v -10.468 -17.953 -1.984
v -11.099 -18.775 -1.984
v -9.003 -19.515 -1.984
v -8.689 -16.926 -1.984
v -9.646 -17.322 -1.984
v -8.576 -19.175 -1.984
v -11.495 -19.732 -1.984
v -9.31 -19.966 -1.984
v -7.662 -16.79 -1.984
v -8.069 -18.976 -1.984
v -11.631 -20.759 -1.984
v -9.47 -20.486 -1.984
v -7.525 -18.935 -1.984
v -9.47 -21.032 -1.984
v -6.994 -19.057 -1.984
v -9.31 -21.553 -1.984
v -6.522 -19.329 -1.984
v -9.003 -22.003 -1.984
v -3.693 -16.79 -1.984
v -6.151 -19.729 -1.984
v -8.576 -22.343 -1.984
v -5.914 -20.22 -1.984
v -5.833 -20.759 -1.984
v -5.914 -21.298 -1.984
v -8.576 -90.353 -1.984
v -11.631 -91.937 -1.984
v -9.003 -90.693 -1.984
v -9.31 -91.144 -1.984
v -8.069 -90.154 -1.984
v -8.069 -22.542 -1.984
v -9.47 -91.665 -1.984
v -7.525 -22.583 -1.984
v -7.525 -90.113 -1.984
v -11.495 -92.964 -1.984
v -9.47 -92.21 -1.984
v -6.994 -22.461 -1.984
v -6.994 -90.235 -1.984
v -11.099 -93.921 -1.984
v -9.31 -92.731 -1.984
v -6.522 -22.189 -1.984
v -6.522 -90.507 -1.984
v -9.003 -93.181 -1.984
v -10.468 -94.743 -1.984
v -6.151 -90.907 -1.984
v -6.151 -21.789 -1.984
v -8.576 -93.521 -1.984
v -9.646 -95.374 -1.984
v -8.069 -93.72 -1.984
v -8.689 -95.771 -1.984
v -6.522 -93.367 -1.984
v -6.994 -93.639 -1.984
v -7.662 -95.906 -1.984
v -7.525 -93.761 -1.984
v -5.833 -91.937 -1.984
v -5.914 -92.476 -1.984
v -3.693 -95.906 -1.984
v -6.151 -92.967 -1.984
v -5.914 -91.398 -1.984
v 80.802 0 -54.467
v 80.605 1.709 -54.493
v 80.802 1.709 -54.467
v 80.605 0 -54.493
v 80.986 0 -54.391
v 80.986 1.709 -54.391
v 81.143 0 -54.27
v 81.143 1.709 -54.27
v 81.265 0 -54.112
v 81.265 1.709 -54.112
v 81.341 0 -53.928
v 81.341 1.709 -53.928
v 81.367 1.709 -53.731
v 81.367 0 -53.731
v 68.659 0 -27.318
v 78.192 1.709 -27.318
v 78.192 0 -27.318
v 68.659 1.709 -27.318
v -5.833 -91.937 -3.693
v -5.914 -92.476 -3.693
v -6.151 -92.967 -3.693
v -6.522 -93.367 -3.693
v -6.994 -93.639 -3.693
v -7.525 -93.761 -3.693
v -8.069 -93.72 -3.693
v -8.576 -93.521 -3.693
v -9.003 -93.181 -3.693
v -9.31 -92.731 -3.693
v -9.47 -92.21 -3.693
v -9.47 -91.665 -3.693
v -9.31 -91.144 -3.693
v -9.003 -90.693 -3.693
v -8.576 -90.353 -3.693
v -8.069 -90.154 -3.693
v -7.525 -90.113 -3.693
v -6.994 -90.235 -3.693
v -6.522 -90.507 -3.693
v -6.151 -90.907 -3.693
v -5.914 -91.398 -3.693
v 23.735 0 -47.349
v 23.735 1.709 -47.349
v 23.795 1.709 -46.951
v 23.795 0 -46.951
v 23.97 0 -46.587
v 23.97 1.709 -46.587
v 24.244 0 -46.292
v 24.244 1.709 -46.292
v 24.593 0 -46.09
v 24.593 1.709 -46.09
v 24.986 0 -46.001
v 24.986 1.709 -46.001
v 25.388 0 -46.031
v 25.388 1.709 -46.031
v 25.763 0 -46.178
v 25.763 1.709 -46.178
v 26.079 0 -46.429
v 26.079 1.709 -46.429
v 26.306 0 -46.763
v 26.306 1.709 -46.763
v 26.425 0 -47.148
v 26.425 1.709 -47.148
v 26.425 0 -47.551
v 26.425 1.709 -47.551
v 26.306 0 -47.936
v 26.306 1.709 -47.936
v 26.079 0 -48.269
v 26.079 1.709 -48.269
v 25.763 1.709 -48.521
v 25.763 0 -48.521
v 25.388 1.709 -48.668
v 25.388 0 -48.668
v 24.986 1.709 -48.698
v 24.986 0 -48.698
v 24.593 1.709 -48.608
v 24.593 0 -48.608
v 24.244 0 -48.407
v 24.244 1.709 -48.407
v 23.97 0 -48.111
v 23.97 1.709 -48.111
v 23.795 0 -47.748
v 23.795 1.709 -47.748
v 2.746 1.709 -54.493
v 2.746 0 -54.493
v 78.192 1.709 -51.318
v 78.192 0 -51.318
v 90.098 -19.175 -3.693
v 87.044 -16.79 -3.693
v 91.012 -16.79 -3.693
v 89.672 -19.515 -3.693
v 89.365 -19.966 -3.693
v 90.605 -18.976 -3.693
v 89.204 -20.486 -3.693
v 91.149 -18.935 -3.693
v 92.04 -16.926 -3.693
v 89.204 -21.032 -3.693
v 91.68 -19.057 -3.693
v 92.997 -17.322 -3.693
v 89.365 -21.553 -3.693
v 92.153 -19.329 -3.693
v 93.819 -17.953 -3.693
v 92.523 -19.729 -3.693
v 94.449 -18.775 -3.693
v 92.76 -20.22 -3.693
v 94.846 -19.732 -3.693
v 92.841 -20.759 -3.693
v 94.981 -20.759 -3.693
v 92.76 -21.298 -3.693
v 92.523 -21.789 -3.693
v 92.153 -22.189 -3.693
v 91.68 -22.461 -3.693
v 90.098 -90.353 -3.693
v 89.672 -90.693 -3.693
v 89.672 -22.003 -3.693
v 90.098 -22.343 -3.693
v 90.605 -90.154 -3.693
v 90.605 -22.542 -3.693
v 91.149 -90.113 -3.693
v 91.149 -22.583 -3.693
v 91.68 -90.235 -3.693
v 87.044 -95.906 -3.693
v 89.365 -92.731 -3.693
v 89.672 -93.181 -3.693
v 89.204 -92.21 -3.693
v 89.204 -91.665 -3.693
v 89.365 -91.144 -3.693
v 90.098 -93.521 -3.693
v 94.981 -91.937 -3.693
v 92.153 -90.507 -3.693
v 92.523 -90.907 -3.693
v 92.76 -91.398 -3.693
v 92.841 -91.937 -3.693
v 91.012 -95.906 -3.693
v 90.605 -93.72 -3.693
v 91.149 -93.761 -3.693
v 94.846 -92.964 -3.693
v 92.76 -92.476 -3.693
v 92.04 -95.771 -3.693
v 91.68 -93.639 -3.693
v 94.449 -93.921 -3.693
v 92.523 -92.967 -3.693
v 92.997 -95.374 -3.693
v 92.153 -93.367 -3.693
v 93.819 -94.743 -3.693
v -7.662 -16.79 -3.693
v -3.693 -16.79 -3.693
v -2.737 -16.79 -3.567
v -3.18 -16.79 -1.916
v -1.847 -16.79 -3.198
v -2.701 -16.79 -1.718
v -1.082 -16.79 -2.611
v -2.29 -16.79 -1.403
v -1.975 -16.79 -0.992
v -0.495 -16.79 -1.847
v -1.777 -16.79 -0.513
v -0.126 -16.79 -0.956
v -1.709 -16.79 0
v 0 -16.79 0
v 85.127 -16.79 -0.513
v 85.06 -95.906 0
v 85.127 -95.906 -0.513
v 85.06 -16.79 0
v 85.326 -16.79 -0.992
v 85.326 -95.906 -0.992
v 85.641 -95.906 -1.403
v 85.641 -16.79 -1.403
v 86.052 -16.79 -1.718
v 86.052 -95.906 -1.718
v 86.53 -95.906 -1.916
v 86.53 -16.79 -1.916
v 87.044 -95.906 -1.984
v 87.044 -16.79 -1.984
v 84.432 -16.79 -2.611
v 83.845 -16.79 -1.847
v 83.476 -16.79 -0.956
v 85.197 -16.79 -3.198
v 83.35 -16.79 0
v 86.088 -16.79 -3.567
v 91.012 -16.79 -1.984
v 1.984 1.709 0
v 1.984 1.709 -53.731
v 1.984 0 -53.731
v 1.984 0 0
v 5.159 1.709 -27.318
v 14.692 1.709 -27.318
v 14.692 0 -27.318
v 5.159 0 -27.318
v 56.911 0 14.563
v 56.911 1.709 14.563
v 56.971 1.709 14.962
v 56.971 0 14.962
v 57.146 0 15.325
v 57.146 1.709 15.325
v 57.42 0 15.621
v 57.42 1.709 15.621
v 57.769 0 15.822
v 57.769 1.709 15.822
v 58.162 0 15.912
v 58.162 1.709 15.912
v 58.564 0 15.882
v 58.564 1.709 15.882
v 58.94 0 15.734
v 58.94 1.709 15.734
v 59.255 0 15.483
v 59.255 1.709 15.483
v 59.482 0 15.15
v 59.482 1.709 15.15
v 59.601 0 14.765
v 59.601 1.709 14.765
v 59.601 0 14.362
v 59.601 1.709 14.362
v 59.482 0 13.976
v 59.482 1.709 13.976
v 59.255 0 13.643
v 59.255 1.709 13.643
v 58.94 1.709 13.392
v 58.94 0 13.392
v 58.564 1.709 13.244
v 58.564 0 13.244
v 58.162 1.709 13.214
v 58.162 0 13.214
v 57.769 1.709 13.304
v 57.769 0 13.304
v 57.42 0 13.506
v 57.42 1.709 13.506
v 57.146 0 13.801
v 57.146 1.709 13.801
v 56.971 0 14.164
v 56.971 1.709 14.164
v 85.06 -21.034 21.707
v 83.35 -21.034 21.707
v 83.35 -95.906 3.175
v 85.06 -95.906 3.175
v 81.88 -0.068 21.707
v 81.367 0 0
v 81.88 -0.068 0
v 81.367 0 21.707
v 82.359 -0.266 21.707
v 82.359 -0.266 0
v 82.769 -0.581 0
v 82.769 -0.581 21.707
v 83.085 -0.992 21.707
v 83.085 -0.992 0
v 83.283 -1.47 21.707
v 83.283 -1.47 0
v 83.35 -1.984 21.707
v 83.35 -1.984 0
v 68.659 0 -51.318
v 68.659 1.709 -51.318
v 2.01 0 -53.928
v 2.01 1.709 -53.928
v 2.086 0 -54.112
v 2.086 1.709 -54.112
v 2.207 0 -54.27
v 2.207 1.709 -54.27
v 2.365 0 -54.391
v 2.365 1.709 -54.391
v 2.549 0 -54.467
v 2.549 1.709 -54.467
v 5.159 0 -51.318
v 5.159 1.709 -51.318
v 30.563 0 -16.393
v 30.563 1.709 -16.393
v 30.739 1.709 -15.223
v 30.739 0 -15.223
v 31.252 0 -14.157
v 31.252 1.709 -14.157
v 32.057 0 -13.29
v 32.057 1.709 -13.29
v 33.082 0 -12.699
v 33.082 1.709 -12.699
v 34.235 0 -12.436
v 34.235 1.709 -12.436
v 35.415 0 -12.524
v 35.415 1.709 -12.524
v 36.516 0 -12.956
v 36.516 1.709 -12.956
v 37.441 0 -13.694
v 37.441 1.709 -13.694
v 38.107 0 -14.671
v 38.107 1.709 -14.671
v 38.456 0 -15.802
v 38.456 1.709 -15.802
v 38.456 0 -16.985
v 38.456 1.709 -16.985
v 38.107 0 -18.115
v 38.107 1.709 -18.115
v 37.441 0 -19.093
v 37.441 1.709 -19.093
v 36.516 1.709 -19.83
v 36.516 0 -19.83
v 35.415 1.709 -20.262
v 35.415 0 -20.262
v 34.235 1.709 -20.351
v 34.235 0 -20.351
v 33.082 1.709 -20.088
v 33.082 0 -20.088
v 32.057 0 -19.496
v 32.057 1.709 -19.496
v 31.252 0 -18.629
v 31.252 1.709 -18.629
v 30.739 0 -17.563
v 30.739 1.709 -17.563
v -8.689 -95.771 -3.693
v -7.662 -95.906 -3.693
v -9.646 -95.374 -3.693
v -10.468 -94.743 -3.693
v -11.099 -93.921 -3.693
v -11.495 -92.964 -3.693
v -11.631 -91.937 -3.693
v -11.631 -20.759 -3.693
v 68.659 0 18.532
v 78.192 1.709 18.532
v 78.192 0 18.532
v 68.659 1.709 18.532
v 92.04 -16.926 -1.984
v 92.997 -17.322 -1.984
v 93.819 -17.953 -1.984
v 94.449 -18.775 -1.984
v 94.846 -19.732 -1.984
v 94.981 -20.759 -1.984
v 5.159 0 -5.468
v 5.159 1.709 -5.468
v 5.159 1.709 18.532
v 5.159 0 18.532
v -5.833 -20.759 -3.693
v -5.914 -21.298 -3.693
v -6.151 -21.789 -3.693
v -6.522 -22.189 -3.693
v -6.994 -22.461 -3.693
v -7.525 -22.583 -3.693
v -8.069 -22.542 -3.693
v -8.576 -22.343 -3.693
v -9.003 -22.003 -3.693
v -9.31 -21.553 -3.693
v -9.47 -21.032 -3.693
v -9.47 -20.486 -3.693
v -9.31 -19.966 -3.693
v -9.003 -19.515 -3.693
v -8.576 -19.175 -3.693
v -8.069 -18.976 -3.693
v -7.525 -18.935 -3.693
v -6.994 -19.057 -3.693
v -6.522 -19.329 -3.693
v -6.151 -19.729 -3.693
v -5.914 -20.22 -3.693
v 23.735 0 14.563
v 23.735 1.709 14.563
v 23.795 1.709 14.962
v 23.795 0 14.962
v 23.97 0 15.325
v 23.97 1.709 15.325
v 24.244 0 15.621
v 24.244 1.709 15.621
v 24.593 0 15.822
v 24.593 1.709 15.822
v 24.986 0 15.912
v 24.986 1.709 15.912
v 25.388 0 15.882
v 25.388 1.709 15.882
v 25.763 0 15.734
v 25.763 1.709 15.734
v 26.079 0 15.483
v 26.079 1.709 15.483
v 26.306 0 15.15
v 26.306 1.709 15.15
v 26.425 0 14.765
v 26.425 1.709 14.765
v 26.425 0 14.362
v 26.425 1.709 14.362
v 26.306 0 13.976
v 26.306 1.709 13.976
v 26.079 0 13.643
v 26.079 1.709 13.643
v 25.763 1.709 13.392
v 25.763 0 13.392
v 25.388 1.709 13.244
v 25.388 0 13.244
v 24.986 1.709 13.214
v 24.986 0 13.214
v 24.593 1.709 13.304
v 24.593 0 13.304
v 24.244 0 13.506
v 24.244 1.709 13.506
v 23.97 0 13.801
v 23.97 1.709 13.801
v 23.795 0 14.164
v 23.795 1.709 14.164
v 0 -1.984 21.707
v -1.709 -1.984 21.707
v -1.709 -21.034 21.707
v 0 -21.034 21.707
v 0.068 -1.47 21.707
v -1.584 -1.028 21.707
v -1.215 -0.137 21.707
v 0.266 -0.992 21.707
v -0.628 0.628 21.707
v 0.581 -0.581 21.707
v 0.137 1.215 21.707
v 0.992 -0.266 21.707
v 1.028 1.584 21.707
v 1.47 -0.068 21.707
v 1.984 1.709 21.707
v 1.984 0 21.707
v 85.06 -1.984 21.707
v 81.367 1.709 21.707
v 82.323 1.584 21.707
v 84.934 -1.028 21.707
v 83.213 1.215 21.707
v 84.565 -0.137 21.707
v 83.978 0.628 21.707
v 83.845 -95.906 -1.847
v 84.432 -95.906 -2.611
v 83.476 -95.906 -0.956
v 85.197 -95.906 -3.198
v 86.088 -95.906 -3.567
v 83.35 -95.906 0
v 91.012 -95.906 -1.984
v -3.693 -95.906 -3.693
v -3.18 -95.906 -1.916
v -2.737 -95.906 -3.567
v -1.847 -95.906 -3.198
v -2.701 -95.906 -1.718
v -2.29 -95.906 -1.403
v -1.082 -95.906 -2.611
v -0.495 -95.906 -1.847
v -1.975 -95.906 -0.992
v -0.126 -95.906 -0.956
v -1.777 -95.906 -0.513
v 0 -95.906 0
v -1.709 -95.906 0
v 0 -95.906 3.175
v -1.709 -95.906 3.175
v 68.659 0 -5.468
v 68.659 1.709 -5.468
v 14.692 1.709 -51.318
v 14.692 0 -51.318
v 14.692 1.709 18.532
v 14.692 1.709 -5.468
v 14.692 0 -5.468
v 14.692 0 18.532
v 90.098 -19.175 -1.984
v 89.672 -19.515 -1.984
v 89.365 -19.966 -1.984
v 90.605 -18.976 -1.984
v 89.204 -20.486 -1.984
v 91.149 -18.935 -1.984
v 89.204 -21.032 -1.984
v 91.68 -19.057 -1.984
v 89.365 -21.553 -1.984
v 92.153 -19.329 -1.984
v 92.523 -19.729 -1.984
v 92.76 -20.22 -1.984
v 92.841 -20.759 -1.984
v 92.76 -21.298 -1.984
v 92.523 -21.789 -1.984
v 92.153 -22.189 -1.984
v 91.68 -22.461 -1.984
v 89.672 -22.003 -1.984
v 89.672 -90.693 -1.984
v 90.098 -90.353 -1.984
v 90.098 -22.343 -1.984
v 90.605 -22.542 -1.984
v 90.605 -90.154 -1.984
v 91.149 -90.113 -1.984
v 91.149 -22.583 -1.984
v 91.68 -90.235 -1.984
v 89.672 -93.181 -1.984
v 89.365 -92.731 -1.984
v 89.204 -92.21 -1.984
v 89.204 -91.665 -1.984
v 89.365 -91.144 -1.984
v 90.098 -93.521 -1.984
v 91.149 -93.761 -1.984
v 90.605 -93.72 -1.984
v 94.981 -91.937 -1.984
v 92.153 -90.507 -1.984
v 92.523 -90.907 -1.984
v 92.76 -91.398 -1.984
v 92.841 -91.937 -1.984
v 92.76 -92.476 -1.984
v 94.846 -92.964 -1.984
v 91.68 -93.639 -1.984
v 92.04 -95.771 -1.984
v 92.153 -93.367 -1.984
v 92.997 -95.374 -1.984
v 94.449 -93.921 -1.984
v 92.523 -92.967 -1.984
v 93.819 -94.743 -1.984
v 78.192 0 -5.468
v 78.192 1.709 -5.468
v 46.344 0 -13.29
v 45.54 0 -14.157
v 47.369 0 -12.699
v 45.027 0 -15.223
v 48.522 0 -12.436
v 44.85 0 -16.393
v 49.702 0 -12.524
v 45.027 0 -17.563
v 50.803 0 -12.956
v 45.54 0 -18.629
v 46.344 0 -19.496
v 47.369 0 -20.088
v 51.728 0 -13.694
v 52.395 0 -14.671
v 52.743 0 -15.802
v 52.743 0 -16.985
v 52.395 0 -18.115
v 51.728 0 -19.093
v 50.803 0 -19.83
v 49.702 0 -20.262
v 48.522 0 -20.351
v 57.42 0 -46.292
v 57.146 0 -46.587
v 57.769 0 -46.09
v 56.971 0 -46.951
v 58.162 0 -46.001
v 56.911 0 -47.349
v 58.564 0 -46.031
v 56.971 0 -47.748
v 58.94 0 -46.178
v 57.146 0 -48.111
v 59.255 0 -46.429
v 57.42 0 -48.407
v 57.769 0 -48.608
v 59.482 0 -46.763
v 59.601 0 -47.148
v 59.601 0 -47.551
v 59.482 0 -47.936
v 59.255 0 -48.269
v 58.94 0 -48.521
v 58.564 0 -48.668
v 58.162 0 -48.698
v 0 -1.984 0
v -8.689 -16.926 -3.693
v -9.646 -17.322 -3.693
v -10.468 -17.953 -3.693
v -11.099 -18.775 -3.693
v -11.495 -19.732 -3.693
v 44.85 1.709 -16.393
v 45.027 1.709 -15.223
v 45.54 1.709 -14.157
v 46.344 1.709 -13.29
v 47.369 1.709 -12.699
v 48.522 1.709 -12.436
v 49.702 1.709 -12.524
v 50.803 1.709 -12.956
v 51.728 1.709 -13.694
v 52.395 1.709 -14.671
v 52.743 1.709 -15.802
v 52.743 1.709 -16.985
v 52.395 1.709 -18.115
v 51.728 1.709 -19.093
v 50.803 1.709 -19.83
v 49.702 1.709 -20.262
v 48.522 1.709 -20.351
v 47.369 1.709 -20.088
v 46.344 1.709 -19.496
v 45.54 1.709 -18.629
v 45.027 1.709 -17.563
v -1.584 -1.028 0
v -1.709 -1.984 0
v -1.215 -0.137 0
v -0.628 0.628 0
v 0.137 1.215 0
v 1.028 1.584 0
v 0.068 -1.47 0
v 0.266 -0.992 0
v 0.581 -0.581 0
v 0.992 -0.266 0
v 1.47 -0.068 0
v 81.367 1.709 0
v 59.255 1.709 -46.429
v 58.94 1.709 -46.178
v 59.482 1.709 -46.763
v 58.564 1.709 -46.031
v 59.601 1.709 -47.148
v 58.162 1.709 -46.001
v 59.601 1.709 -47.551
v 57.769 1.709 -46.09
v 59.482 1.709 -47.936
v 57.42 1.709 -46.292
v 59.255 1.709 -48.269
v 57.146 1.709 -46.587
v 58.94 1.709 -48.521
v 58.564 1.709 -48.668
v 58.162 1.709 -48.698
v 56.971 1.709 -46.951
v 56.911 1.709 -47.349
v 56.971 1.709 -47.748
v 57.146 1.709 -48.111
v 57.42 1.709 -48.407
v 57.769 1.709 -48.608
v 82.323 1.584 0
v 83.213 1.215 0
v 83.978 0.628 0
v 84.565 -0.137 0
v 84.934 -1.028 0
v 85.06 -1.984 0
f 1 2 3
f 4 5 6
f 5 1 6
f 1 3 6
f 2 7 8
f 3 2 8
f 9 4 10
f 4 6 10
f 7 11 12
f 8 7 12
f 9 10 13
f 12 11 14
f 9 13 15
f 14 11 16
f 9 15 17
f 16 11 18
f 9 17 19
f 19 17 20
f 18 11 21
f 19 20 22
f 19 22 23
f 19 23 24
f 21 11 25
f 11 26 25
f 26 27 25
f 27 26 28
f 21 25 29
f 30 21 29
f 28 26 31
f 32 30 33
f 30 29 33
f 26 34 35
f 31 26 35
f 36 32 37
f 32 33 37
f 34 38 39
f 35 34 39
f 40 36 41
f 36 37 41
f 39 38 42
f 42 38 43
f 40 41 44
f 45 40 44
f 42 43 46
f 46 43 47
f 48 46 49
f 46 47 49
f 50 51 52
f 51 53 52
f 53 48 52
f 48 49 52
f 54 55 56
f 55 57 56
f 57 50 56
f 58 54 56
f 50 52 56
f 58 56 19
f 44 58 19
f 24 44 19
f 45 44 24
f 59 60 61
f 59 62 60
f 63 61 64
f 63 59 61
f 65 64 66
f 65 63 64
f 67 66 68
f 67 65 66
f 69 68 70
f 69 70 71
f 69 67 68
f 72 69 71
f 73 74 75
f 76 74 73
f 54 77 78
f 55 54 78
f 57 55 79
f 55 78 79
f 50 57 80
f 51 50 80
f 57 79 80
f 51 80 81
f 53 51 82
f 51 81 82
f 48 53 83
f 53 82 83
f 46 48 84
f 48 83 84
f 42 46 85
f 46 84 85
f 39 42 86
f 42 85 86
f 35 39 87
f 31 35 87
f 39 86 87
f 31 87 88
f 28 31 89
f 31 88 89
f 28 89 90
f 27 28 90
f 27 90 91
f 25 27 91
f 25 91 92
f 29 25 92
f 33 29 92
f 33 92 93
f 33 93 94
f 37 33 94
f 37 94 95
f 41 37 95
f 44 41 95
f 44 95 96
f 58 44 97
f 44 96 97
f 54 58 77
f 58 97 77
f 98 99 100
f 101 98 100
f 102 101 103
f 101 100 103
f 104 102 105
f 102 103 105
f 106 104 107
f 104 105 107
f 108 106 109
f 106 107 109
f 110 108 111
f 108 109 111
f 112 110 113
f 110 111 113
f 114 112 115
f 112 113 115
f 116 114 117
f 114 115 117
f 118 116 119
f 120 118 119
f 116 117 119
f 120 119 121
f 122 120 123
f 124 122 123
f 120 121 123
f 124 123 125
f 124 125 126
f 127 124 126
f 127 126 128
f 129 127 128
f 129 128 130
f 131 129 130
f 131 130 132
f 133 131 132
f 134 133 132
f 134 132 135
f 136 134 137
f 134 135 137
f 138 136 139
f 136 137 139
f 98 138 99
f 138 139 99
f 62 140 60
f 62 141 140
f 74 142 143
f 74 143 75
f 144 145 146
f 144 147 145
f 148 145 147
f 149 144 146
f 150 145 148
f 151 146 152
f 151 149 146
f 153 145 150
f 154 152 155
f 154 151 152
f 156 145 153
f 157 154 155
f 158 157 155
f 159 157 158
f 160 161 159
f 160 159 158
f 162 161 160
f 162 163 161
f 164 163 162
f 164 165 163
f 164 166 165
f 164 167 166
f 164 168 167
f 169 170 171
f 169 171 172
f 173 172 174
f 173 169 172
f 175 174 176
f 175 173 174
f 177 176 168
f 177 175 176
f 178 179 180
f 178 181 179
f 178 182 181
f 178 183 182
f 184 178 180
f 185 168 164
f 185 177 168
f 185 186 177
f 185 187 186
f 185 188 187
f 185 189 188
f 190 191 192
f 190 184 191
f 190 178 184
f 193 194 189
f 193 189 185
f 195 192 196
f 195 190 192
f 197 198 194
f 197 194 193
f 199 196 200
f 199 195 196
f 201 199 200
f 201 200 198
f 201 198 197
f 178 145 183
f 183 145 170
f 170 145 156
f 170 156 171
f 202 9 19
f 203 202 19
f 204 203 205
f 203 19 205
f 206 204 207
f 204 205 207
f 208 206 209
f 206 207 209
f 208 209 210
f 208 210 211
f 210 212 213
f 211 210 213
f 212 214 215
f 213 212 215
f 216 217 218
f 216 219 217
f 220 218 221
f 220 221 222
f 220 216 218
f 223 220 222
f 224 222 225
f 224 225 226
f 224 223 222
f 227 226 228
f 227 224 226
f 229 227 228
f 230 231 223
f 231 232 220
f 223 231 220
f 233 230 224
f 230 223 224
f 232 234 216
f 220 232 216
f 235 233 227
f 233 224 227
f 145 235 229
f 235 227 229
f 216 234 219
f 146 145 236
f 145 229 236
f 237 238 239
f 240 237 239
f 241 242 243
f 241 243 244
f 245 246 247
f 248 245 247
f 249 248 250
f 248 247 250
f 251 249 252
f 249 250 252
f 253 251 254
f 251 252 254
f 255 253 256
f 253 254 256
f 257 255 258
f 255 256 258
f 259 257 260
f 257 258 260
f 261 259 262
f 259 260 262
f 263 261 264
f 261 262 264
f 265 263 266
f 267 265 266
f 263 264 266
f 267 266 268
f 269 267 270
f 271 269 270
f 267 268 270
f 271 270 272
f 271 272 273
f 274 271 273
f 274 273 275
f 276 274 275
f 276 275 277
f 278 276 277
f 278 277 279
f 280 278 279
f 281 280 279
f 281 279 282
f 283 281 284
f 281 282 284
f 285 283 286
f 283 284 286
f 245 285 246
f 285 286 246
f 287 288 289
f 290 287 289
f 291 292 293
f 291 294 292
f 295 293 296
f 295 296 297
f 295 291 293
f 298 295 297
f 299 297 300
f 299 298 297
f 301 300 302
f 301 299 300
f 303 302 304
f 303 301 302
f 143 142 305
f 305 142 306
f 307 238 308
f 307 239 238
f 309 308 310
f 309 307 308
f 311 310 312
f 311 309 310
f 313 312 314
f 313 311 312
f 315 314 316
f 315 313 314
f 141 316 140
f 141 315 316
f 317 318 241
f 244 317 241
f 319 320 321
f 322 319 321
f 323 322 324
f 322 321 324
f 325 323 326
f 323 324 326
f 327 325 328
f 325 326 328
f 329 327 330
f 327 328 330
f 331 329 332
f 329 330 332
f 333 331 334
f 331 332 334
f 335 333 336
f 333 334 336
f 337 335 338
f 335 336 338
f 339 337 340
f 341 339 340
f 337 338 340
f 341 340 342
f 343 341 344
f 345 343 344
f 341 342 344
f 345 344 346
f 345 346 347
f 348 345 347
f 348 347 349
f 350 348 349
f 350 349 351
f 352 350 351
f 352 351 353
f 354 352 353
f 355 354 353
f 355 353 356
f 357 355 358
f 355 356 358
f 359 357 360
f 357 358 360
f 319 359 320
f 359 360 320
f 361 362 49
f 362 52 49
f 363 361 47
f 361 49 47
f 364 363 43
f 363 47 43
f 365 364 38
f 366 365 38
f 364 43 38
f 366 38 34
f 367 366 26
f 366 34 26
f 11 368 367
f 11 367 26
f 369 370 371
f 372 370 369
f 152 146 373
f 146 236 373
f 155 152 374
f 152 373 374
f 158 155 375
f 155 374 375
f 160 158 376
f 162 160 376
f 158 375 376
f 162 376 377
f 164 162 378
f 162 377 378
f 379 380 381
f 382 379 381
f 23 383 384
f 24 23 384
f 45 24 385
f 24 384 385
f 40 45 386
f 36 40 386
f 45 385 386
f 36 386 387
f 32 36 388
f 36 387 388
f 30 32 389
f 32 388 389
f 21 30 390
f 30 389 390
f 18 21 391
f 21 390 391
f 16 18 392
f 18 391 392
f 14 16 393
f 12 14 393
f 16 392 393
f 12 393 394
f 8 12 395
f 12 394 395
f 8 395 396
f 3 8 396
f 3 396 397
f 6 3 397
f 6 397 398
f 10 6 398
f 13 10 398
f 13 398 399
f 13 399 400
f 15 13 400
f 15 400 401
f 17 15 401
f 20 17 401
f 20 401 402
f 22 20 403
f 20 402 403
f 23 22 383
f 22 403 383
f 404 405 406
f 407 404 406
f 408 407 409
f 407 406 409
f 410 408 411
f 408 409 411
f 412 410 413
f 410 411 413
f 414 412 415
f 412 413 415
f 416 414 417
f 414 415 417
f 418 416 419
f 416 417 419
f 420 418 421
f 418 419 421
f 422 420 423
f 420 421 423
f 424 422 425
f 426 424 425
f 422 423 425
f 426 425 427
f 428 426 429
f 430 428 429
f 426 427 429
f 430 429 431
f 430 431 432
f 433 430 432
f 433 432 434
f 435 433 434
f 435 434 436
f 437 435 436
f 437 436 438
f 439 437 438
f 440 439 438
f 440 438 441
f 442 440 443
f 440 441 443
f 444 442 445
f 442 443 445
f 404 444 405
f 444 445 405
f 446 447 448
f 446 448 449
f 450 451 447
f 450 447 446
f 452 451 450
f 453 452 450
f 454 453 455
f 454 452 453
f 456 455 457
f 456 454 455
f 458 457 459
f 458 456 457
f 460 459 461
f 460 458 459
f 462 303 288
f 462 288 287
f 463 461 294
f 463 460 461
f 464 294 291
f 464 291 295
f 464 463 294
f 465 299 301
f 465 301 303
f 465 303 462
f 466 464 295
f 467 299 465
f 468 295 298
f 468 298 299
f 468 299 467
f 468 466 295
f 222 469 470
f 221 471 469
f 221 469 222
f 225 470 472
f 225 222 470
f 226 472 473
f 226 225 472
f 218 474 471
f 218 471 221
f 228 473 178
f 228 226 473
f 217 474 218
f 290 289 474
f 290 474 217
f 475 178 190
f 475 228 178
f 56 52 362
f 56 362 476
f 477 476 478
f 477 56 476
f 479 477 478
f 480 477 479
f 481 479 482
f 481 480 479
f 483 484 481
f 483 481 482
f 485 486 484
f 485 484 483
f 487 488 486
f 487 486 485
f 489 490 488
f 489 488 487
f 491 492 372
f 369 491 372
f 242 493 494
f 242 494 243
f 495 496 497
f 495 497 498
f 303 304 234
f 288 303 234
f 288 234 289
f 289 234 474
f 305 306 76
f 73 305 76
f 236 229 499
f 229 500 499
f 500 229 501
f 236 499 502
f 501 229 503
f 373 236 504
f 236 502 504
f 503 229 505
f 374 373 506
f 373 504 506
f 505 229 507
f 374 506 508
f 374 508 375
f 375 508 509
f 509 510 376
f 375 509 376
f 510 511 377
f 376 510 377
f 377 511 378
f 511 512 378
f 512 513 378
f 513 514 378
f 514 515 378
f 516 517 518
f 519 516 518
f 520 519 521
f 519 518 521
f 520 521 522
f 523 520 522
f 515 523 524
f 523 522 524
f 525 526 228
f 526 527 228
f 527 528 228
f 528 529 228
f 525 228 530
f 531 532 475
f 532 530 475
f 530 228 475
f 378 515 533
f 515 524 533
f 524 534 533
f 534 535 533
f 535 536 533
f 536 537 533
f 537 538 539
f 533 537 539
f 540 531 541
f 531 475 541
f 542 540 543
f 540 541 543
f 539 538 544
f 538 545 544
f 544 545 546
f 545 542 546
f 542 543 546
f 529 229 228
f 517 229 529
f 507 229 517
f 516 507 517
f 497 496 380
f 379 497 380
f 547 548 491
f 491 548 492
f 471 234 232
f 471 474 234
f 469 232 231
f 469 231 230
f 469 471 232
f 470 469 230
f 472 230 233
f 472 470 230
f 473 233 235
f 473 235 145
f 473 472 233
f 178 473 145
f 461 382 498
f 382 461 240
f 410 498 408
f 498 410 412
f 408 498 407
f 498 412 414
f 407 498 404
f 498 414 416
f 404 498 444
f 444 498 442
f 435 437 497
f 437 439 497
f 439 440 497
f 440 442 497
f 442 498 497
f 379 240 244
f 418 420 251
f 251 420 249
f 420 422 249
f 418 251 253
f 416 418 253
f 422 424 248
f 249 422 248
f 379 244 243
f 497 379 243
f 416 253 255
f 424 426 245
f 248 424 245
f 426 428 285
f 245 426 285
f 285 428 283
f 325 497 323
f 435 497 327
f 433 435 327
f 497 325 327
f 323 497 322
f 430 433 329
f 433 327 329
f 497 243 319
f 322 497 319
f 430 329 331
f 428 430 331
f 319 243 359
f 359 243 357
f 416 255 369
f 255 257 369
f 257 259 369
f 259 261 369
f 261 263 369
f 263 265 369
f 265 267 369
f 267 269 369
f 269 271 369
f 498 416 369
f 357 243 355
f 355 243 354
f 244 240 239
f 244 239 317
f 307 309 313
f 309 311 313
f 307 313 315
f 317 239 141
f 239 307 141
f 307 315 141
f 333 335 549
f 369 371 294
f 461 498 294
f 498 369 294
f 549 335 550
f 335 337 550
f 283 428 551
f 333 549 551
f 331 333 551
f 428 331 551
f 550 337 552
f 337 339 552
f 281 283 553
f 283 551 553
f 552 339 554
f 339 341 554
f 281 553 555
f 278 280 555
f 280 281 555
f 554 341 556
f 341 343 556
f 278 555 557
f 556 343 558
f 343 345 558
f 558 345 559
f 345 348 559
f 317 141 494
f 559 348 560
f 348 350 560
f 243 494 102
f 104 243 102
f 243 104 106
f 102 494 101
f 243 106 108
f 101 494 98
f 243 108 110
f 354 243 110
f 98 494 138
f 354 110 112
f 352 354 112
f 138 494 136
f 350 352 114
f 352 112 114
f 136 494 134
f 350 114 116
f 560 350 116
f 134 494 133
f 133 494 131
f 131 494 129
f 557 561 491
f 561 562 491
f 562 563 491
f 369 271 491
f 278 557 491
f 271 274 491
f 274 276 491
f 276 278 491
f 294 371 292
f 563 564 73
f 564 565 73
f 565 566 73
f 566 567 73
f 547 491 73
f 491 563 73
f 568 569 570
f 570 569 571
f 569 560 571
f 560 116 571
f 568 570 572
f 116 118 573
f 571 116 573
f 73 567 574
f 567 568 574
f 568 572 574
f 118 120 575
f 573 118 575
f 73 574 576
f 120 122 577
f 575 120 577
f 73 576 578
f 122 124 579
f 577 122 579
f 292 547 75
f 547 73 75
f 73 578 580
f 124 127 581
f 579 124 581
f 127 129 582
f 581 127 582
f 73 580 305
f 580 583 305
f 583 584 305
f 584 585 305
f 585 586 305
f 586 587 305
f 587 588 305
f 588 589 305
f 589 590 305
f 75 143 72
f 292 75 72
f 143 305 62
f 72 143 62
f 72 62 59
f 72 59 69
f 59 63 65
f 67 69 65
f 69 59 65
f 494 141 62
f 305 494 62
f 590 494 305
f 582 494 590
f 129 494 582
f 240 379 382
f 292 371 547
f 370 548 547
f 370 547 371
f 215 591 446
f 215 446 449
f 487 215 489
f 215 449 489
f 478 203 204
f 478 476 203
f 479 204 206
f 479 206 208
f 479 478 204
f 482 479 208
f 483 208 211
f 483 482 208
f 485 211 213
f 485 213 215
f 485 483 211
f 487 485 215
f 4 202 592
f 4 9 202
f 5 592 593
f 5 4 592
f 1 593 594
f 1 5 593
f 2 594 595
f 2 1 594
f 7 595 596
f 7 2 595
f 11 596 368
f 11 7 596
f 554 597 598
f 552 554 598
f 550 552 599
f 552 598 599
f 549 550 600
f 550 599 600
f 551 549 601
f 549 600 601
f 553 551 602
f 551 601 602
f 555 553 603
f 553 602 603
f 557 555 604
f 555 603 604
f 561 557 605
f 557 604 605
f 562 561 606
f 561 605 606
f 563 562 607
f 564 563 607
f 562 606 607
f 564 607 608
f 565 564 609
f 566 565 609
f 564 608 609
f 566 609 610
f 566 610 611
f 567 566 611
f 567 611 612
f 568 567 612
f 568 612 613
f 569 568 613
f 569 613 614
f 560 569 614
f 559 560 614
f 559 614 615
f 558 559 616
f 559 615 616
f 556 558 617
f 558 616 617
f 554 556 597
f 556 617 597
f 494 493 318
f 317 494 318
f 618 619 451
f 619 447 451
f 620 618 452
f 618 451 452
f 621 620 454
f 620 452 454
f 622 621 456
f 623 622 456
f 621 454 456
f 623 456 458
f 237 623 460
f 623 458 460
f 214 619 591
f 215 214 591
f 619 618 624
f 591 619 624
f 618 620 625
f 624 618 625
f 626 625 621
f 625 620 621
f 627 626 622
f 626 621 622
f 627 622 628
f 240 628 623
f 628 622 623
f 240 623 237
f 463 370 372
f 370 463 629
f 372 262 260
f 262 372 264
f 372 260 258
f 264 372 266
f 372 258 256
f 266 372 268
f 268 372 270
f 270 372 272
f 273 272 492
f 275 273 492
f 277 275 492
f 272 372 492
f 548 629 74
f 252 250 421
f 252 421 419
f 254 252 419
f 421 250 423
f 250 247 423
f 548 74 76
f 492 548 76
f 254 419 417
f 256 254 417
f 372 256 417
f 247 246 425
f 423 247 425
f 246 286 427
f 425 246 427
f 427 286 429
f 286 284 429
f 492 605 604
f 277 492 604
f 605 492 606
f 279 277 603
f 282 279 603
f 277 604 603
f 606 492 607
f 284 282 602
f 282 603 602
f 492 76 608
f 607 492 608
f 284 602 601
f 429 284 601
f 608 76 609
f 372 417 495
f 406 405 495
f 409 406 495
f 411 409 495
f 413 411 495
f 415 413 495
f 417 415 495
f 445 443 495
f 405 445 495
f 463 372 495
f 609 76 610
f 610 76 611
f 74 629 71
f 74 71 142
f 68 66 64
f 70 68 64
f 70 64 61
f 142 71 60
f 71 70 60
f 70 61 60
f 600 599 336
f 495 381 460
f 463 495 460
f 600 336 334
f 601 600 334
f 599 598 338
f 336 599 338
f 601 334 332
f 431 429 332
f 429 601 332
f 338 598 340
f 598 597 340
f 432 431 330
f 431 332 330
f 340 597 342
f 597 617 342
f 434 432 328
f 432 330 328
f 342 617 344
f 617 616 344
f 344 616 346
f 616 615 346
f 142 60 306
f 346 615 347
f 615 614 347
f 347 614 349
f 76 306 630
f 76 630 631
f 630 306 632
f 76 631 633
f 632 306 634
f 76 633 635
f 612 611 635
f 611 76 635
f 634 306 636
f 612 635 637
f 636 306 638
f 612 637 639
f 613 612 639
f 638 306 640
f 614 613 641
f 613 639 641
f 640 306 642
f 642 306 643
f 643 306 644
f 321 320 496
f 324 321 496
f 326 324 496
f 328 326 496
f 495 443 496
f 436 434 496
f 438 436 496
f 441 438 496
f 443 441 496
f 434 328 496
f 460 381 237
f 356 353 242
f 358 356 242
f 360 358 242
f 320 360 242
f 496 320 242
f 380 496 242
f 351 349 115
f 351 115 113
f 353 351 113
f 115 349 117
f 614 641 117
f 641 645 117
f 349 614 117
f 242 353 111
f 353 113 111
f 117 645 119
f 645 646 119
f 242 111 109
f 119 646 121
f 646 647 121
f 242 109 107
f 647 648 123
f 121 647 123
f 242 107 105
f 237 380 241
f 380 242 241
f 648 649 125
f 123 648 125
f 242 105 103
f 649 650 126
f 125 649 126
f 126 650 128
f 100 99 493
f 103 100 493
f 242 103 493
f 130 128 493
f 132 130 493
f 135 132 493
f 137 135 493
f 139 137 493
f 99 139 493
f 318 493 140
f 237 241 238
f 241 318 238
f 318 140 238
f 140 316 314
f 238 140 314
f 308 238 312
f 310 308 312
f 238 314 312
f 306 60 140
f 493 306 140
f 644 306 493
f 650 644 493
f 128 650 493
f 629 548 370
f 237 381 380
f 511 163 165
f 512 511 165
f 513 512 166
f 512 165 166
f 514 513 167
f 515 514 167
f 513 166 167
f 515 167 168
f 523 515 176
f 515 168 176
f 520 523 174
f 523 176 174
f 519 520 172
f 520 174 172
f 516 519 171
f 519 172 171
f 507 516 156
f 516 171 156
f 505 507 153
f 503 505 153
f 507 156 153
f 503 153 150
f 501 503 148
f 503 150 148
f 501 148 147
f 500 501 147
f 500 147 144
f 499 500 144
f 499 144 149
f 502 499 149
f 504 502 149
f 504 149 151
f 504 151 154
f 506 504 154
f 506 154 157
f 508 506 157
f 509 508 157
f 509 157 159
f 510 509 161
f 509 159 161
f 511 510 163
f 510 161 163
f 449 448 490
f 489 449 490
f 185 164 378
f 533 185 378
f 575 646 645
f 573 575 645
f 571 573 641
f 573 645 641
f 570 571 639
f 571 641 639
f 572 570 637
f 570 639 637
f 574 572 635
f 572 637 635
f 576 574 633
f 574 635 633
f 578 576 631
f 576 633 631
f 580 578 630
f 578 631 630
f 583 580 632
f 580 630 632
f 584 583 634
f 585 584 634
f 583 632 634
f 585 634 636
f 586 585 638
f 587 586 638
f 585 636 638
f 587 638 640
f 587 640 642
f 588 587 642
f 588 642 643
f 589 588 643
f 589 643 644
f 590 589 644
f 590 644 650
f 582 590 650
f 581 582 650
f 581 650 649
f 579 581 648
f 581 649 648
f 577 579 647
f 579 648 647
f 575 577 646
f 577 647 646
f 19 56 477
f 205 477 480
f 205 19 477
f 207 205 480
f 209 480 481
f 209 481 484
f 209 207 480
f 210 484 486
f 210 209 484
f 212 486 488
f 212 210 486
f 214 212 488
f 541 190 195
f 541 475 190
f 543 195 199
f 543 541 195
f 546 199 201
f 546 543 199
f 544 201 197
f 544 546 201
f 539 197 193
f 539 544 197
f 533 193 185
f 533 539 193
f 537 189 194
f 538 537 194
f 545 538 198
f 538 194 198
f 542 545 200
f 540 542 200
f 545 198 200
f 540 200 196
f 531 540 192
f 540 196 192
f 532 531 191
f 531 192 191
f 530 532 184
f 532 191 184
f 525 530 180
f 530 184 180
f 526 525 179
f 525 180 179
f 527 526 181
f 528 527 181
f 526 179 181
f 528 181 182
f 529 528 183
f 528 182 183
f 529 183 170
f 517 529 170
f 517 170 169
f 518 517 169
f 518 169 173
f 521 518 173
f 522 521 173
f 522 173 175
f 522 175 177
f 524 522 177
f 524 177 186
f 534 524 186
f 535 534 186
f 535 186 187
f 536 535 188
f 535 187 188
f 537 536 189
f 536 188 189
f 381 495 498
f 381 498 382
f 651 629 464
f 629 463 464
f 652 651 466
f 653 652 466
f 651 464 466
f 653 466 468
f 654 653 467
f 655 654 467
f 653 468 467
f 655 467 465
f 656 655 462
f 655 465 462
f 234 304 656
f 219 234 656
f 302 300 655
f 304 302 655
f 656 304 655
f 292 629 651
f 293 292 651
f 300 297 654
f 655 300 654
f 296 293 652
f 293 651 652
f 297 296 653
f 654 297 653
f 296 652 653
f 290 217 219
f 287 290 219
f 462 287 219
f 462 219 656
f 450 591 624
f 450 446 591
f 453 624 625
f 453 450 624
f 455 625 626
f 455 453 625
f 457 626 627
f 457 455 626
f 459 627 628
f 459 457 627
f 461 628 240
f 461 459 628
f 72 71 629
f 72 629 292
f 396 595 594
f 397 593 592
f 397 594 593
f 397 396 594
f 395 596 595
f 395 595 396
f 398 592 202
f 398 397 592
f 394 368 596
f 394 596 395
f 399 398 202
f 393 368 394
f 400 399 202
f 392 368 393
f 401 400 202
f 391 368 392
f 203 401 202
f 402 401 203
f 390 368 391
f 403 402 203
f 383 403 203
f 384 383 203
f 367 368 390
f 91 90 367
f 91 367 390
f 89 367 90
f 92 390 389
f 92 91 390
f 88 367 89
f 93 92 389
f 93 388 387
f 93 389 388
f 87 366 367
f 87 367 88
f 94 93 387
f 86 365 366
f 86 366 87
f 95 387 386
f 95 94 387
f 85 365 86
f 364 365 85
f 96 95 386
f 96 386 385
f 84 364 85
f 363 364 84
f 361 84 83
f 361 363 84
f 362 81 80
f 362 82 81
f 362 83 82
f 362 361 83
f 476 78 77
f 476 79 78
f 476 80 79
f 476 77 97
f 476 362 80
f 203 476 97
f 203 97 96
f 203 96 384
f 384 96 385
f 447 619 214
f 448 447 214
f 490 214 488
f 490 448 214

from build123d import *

# Parameters (mm, degrees)
F1_DEPTH  = 21.70684
F2_W      = 1.70942
F2_H      = 79.1155667
F3_DEPTH  = 3.69316
F4_W      = 9.92124
F4_H      = 1.70942
F5_DEPTH  = 79.1155667
F6_W      = 79.3829248
F6_H      = 1.70942
F7_DEPTH  = 54.49316
F8_W      = 9.5329248
F8_H      = 24
F8_R      = 1.35255
F8_R_2    = 3.96875
F9_DEPTH  = 1.70942
F10_R     = 0.762
F11_R     = 3.96875
F12_R     = 3.69316
F13_R     = 1.98374
F15_DEPTH = 86.7692448
F16_R     = 1.8288
F17_DEPTH = 1.70942


with BuildPart() as f1:
    # F0 (on Top) → F1 (new body)
    with BuildSketch(Plane.XY):
        Polygon((-1.70942, -95.9058534), (0, -95.9058534), (0, 0), (83.3504048, 0), (83.3504048, -95.9058534), (85.0598248, -95.9058534), (85.0598248, 1.70942), (-1.70942, 1.70942), align=None)
    extrude(amount=F1_DEPTH)

    # F2 (on face) → F3 (join)
    with BuildSketch(Plane(origin=(0, 0, 0), x_dir=(1, 0, 0), z_dir=(0, 0, -1))):
        with Locations((-0.85471, 56.34807005)):
            Rectangle(F2_W, F2_H)
        with Locations((84.2051148, 56.34807005)):
            Rectangle(F2_W, F2_H)
    extrude(amount=F3_DEPTH)

    # F4 (on face) → F5 (join, through all)
    with BuildSketch(Plane.XZ.offset(95.9058534)):
        with Locations((90.0204448, -2.83845)):
            Rectangle(F4_W, F4_H)
        with Locations((-6.67004, -2.83845)):
            Rectangle(F4_W, F4_H)
    extrude(amount=-F5_DEPTH)

    # F6 (on face) → F7 (join)
    with BuildSketch(Plane(origin=(0, 0, 0), x_dir=(1, 0, 0), z_dir=(0, 0, -1))):
        with Locations((41.6752024, -0.85471)):
            Rectangle(F6_W, F6_H)
    extrude(amount=F7_DEPTH)

    # F8 (on face) → F9 (cut, through all)
    with BuildSketch(Plane(origin=(0, 1.70942, 0), x_dir=(-1, 0, 0), z_dir=(0, 1, 0))):
        with Locations((-9.9252024, -39.31816)):
            Rectangle(F8_W, F8_H)
        with Locations((-9.9252024, 6.53184)):
            Rectangle(F8_W, F8_H)
        with Locations((-73.4252024, 6.53184)):
            Rectangle(F8_W, F8_H)
        with Locations((-73.4252024, -39.31816)):
            Rectangle(F8_W, F8_H)
        with Locations((-25.0871228, -47.34941)):
            Circle(F8_R)
        with Locations((-58.263282, -47.34941)):
            Circle(F8_R)
        with Locations((-58.263282, 14.56309)):
            Circle(F8_R)
        with Locations((-25.0871228, 14.56309)):
            Circle(F8_R)
        with Locations((-48.8189524, -16.39316)):
            Circle(F8_R_2)
        with Locations((-34.5314524, -16.39316)):
            Circle(F8_R_2)
    extrude(amount=-F9_DEPTH, mode=Mode.SUBTRACT)

    # F10
    f10_edges = [f1.edges().sort_by_distance(p)[0] for p in [
        (1.98374, 0.85471, -54.49316),
        (81.366665, 0.85471, -54.49316),
    ]]
    fillet(f10_edges, radius=F10_R)

    # F11
    f11_edges = [f1.edges().sort_by_distance(p)[0] for p in [
        (94.981065, -95.905853, -2.83845),
        (-11.63066, -16.790287, -2.83845),
        (-11.63066, -95.905853, -2.83845),
        (94.981065, -16.790287, -2.83845),
    ]]
    fillet(f11_edges, radius=F11_R)

    # F12
    f12_edges = [f1.edges().sort_by_distance(p)[0] for p in [
        (0, -56.34807, -3.69316),
        (-1.70942, 1.70942, 10.85342),
        (85.059825, 1.70942, 10.85342),
        (83.350405, -56.34807, -3.69316),
    ]]
    fillet(f12_edges, radius=F12_R)

    # F13
    f13_edges = [f1.edges().sort_by_distance(p)[0] for p in [
        (83.350405, 0, 10.85342),
        (0, 0, 10.85342),
        (85.059825, -56.34807, -1.98374),
        (-1.70942, -56.34807, -1.98374),
    ]]
    fillet(f13_edges, radius=F13_R)

    # F14 (on face) → F15 (cut, through all)
    with BuildSketch(Plane(origin=(-1.70942, 0, 0), x_dir=(0, -1, 0), z_dir=(-1, 0, 0))):
        Polygon((95.9058534, 21.70684), (21.03374, 21.70684), (95.9058534, 3.175), align=None)
    extrude(amount=-F15_DEPTH, mode=Mode.SUBTRACT)

    # F16 (on face) → F17 (cut, through all)
    with BuildSketch(Plane(origin=(0, 0, -3.69316), x_dir=(1, 0, 0), z_dir=(0, 0, -1))):
        with Locations((-7.66191, 91.9371034)):
            Circle(F16_R)
        with Locations((-7.66191, 20.7590367)):
            Circle(F16_R)
        with Locations((91.0123148, 91.9371034)):
            Circle(F16_R)
        with Locations((91.0123148, 20.7590367)):
            Circle(F16_R)
    extrude(amount=-F17_DEPTH, mode=Mode.SUBTRACT)


solid = f1.part
